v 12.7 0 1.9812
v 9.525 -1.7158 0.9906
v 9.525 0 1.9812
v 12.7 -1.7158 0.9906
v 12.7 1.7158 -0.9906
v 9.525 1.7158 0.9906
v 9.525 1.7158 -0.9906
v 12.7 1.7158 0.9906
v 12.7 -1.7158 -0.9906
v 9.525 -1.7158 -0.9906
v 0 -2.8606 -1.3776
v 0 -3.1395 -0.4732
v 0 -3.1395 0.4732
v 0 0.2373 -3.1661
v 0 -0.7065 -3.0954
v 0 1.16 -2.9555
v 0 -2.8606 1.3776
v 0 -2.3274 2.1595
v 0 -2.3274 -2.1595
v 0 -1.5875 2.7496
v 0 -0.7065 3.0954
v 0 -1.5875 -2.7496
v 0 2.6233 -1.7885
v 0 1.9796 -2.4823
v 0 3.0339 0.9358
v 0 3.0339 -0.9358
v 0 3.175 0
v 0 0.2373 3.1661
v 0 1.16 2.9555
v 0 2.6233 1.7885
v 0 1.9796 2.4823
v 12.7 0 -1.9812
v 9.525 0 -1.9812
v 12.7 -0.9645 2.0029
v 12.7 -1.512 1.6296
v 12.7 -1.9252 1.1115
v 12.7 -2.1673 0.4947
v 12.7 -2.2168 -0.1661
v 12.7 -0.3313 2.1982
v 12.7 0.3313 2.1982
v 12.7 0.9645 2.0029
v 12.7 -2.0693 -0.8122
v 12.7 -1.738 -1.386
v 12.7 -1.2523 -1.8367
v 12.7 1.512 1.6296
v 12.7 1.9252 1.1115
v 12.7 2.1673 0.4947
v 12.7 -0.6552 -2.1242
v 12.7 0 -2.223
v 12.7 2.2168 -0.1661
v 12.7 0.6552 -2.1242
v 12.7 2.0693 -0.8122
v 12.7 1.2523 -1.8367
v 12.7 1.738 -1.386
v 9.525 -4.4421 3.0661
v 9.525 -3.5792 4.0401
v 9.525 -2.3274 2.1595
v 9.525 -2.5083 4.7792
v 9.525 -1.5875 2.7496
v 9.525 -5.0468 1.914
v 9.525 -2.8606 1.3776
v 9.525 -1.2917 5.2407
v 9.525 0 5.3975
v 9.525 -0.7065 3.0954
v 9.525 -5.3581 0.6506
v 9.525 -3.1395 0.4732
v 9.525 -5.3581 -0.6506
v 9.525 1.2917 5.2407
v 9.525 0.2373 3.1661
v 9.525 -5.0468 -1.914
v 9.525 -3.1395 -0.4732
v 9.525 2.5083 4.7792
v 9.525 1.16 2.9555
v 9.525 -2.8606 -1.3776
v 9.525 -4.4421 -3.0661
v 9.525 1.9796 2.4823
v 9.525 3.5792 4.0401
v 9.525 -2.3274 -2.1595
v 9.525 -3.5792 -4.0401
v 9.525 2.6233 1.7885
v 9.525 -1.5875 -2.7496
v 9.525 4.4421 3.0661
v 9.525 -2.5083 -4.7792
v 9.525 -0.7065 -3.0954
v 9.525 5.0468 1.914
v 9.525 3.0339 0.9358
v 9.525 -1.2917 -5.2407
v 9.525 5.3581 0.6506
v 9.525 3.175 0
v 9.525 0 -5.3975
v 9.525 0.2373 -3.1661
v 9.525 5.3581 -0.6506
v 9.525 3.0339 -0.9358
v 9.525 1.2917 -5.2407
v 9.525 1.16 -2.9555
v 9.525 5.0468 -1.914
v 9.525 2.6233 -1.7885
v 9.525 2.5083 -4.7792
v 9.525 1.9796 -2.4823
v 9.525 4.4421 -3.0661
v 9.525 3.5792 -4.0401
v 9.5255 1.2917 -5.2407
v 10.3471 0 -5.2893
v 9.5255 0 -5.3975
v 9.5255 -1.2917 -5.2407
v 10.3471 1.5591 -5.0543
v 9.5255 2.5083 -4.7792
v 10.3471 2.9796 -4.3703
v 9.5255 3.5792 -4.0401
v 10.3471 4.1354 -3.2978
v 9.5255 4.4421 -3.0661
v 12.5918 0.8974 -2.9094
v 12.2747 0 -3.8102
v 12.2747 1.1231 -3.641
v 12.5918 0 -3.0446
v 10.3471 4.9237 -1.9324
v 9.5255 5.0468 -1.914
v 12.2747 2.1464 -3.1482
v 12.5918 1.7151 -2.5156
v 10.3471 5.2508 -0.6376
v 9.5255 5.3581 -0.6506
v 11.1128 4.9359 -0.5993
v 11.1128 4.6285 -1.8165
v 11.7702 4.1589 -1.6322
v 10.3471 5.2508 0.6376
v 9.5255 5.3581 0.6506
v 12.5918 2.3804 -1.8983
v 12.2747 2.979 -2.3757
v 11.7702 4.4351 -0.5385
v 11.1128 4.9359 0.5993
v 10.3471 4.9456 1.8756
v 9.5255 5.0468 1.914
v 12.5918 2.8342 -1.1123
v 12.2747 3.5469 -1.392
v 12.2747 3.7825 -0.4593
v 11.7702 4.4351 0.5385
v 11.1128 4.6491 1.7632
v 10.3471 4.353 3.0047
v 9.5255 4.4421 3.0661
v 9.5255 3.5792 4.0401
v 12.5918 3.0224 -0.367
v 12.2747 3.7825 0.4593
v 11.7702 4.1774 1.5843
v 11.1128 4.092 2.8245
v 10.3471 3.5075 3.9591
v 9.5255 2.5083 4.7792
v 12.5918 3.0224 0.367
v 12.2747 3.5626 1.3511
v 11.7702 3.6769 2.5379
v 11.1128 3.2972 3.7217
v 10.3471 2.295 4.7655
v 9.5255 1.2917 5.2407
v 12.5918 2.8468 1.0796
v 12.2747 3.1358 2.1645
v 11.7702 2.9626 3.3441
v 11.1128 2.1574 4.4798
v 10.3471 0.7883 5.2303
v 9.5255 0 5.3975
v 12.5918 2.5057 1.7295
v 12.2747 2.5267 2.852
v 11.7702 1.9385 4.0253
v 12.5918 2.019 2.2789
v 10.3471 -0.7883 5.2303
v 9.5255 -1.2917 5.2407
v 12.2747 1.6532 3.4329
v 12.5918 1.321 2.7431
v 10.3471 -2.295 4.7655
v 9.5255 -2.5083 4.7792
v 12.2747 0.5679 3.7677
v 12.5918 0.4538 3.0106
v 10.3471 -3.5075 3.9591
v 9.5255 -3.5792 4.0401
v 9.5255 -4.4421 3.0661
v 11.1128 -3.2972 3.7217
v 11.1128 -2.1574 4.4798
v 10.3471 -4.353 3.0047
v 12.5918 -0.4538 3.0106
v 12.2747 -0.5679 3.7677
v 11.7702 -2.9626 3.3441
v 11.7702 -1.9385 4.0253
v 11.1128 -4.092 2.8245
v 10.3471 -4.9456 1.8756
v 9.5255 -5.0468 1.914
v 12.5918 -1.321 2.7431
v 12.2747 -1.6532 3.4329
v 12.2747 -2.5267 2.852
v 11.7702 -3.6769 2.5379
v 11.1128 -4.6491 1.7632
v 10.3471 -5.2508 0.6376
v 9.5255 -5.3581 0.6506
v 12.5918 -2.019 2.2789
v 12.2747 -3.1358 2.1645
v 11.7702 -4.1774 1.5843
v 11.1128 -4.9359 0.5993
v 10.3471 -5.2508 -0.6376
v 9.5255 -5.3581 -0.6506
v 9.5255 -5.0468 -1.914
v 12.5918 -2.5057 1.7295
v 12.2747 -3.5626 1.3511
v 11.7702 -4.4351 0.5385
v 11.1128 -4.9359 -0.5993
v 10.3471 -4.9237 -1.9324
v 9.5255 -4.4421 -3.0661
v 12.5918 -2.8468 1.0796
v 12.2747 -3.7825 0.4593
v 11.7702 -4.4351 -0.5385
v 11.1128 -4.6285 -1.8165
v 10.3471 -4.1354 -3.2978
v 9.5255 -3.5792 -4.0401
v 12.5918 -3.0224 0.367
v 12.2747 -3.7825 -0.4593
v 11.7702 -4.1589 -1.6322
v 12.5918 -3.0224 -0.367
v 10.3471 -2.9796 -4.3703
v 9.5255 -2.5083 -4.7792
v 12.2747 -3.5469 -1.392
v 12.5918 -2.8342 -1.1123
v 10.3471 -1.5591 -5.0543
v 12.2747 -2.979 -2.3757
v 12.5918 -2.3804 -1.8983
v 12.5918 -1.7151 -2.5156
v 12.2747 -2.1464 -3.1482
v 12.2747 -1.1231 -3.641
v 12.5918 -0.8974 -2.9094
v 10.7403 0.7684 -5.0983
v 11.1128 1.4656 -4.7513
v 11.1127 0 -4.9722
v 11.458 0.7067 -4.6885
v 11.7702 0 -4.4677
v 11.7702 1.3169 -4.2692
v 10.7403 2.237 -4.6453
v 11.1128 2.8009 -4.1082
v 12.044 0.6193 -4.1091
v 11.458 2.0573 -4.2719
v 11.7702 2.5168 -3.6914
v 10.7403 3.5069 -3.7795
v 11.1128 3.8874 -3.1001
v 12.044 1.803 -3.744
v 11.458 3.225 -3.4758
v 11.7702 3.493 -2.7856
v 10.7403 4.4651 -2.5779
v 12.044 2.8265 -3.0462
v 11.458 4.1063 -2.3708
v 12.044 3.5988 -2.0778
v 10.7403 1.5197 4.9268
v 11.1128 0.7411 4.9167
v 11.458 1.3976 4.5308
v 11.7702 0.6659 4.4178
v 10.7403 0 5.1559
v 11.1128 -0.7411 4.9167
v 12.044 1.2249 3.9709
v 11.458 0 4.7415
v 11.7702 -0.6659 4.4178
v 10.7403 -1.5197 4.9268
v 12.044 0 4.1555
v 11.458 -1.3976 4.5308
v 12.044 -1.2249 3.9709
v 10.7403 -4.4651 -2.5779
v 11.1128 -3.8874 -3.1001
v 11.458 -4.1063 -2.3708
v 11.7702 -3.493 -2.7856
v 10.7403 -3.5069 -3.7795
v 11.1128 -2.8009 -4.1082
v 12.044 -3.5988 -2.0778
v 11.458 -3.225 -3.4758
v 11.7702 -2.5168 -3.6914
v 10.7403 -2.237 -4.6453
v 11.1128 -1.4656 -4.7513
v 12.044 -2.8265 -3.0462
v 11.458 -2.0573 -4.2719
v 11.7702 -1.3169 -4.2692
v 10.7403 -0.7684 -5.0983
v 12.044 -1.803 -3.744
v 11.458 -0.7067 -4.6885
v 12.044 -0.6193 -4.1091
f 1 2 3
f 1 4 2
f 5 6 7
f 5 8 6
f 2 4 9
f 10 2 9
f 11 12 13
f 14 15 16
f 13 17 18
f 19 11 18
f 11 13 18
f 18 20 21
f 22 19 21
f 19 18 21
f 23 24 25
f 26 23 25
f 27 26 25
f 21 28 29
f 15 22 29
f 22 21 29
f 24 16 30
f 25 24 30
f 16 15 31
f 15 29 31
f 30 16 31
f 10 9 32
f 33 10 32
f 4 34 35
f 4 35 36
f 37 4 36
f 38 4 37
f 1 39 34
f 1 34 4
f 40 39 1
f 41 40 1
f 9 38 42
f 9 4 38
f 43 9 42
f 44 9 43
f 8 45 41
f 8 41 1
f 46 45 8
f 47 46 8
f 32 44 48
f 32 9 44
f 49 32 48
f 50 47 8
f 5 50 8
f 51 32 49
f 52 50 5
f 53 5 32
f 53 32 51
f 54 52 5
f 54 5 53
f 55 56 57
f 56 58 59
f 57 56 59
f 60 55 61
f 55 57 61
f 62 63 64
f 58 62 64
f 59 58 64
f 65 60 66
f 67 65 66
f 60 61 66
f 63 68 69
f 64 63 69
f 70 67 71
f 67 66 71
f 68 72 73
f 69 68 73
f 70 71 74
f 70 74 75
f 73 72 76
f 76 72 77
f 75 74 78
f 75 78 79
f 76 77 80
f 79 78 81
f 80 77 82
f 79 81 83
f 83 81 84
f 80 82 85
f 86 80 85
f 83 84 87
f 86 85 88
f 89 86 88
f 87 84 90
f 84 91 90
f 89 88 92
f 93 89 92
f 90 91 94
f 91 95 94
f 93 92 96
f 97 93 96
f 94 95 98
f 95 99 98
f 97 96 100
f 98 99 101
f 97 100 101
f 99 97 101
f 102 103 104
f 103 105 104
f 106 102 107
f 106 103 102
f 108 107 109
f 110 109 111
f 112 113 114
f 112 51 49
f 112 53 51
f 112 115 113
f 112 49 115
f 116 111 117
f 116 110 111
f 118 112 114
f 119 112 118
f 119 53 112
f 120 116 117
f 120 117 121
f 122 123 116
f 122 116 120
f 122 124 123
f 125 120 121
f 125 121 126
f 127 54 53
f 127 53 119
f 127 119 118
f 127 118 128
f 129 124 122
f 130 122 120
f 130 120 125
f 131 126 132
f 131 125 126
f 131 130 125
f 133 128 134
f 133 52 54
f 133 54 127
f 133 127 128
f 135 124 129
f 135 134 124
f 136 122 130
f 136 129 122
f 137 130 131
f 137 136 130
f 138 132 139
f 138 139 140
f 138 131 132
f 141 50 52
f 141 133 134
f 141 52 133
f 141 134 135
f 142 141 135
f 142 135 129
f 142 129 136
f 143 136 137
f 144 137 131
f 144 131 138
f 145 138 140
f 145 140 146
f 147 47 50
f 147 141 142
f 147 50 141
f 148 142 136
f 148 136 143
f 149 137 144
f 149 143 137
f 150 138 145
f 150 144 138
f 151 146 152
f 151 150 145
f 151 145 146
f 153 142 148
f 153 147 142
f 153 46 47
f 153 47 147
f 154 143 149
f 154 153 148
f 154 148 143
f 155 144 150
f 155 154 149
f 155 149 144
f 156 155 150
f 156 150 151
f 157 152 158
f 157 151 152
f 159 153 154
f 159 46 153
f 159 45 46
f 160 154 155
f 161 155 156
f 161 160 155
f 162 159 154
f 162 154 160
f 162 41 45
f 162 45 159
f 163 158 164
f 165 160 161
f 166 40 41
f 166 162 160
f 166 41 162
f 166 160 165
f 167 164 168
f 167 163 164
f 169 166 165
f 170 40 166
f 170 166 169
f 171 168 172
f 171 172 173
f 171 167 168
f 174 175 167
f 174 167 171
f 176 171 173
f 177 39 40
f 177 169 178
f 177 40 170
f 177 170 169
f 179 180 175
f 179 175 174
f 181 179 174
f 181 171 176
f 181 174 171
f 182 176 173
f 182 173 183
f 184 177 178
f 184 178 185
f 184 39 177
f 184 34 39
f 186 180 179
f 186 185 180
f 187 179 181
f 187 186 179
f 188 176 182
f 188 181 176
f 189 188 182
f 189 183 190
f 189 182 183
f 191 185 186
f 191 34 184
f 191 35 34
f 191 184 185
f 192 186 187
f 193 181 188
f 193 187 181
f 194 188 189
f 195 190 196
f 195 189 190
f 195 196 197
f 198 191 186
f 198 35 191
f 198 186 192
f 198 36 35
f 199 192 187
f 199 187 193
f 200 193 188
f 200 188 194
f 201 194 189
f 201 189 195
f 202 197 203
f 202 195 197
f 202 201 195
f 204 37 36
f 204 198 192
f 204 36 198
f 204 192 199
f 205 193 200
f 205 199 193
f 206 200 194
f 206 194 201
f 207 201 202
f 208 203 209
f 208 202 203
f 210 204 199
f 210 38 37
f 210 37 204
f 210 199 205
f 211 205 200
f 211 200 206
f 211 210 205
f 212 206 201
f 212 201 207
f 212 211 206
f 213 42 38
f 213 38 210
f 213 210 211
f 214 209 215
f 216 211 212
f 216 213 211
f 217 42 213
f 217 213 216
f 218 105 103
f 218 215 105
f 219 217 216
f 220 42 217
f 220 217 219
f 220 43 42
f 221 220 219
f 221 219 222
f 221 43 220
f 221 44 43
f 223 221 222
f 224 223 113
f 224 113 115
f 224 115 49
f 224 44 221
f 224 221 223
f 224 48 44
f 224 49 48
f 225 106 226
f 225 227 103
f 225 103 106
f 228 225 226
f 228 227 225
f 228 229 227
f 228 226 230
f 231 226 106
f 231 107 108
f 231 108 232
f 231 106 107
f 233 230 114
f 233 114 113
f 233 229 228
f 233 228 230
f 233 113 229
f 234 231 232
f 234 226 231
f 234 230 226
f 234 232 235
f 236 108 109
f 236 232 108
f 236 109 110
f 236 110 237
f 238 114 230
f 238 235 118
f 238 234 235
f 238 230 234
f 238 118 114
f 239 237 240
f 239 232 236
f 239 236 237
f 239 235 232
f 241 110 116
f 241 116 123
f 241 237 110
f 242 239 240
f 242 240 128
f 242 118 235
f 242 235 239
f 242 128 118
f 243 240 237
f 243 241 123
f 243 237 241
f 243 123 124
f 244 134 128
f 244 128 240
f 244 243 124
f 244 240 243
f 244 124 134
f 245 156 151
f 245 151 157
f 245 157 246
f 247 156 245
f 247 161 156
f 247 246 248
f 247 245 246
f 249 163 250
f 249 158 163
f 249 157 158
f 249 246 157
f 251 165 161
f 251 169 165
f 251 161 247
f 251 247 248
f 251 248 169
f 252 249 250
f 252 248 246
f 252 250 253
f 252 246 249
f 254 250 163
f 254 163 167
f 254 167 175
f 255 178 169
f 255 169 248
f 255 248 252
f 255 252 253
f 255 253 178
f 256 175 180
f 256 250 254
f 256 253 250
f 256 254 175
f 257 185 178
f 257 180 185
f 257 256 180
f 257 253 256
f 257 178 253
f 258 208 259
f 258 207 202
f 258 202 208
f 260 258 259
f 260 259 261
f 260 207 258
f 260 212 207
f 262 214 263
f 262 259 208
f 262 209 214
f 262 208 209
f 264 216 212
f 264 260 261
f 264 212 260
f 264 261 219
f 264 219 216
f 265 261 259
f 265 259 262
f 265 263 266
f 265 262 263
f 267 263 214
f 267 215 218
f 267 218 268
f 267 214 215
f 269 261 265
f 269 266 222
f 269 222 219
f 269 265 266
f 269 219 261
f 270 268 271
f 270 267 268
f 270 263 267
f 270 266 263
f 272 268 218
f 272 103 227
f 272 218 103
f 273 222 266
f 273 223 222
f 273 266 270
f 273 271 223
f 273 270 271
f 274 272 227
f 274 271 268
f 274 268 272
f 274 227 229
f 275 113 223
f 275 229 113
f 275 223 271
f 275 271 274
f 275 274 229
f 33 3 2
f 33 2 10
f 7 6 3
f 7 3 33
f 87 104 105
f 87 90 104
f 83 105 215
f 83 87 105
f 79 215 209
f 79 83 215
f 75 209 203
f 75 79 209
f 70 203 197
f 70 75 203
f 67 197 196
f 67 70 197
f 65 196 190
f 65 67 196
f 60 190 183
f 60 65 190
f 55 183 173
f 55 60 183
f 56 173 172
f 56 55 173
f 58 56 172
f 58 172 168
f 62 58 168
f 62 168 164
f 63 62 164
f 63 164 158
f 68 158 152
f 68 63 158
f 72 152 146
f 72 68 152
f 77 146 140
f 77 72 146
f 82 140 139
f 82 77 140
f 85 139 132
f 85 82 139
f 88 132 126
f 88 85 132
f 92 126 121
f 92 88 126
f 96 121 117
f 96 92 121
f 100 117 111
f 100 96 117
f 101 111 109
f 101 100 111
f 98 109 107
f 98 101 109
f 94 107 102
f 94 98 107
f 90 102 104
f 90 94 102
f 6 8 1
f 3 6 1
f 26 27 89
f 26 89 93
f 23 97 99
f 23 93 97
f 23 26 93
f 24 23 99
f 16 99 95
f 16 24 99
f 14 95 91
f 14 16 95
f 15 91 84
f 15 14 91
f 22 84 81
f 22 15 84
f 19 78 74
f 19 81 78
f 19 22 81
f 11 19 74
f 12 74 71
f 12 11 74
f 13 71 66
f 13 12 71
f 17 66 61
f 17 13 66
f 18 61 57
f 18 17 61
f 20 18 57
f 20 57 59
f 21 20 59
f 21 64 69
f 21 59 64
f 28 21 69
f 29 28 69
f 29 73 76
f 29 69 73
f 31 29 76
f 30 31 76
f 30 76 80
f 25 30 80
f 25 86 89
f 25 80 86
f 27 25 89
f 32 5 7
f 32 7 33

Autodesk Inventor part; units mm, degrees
ref_plane "YZ Plane" through (0, 0, 0) normal (1, 0, 0) x (0, 1, 0)
ref_plane "XZ Plane" through (0, 0, 0) normal (0, 1, 0) x (-1, 0, 0)
ref_plane "XY Plane" through (0, 0, 0) normal (0, 0, 1) x (1, 0, 0)
sketch "Sketch1" plane through (0, 0, 0) normal (1, 0, 0) x (0, 1, 0)
  circle A0 centre (0, 0) radius 3.175
  dimension "d0" = 6.35
extrude "Extrusion1" add sketch "Sketch1" along normal blind 9.525
sketch "Sketch2" plane through (9.525, 0, 0) normal (1, 0, 0) x (0, 0, -1)
  circle A0 centre (0, 0) radius 5.3975
  dimension "d3" = 10.795
extrude "Extrusion2" add sketch "Sketch2" along normal blind 3.175
sketch "Sketch3" plane through (12.7, 0, 0) normal (1, 0, 0) x (0, 0, -1)
  line L0 (0, 0) -> (1.9812, 0)
  line L1 (0, 0) -> (-1.9812, 0)
  circle A0 centre (0, 0) radius 3.175 projected
  line L2 (0, 0) -> (0.9906, 1.7158)
  line L3 (0, 0) -> (1.9812, 0) construction
  line L4 (0.9906, 1.7158) -> (1.9812, 0)
  line L5 (0, 0) -> (-0.9906, 1.7158)
  line L6 (0, 0) -> (1.9812, 0) construction
  line L7 (-0.9906, 1.7158) -> (0.9906, 1.7158)
  line L8 (-0.9906, 1.7158) -> (-1.9812, 0)
  line L9 (0, 0) -> (0.9906, -1.7158)
  line L10 (0, 0) -> (1.9812, 0) construction
  line L11 (0.9906, -1.7158) -> (1.9812, 0)
  line L12 (0, 0) -> (-0.9906, -1.7158)
  line L13 (0, 0) -> (1.9812, 0) construction
  line L14 (-0.9906, -1.7158) -> (0.9906, -1.7158)
  line L15 (-0.9906, -1.7158) -> (-1.9812, 0)
  dimension "d6" = 1.9812
  dimension "d7" = 1.9812
  dimension "d8" = 1.9812
  dimension "d9" = 60
  dimension "d10" = 1.9812
  dimension "d11" = 120
  dimension "d12" = 1.9812
  dimension "d13" = 60
  dimension "d14" = 1.9812
  dimension "d15" = 120
extrude "Extrusion3" cut sketch "Sketch3" against normal blind 3.175 contours L2 L4 L0 | L12 L15 L1 | L5 L7 L2 | L1 L8 L5 | L0 L11 L9 | L9 L14 L12
fillet "Fillet1" radius 3.175 1 edges at (12.7, 0, 5.3975)
thread "Thread1" size "1/4-20 UNC" class "2A" standard "ANSI Unified Screw Threads" full length
properties part number "1-4-20 screw"
